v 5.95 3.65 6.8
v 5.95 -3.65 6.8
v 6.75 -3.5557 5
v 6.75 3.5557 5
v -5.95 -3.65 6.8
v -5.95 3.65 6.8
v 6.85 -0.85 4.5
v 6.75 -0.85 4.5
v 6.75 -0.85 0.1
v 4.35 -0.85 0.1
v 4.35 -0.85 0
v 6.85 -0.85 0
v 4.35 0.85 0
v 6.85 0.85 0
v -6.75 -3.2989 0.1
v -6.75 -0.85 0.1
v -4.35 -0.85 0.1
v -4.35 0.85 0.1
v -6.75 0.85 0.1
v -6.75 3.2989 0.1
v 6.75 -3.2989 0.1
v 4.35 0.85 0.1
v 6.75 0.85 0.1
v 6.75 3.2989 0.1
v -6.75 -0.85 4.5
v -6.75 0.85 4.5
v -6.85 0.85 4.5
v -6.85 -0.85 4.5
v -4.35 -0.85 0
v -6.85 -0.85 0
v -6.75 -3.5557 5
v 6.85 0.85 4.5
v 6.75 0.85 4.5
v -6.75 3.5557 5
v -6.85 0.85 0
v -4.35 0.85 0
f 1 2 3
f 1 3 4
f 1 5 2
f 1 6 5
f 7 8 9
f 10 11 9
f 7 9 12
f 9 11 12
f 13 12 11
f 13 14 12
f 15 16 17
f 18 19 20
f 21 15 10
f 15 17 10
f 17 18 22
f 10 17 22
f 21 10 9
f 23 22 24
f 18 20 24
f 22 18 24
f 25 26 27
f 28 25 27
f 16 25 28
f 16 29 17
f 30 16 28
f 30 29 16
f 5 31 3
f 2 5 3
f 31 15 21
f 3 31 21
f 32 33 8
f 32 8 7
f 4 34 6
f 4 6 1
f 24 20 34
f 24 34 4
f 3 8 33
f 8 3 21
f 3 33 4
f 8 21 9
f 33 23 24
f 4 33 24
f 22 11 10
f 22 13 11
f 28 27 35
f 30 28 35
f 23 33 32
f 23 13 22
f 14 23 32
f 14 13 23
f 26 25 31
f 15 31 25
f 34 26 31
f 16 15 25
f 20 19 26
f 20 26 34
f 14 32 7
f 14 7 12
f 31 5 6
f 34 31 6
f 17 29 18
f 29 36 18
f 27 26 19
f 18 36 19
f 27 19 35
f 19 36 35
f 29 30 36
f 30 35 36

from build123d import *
from OCP.BRepFilletAPI import BRepFilletAPI_MakeChamfer

# Parameters (mm, degrees)
BOSS_EXTRUDE1_START = 0.1
SKETCH1_W           = 13.5
SKETCH1_H           = 7.3
BOSS_EXTRUDE1_DEPTH = 6.7
CHAMFER1_SIZE       = 1.8
CHAMFER1_SIZE2      = 0.8
BOSS_EXTRUDE2_DEPTH = 0.85
DRAFT1_ANGLE        = -3


with BuildPart() as part:
    # Sketch1 → Boss-Extrude1 (new body)
    with BuildSketch(Plane.XY.offset(BOSS_EXTRUDE1_START)):
        Rectangle(SKETCH1_W, SKETCH1_H)
    extrude(amount=BOSS_EXTRUDE1_DEPTH)

    # Chamfer1: one chamfer whose edges measure the first distance from different faces: ONE call of the kernel's chamfer builder (chamfer() names one face for all edges)
    chamfer1_edges_1 = [part.edges().sort_by_distance(p)[0] for p in [
        (6.75, 0, 6.8),
    ]]
    chamfer1_side_1 = [part.faces().sort_by_distance(p)[0] for p in [
        (6.75, 0, 3.45),
    ]]
    chamfer1_edges_2 = [part.edges().sort_by_distance(p)[0] for p in [
        (-6.75, 0, 6.8),
    ]]
    chamfer1_side_2 = [part.faces().sort_by_distance(p)[0] for p in [
        (-6.75, 0, 3.45),
    ]]
    chamfer1 = BRepFilletAPI_MakeChamfer(part.part.solid().wrapped)
    for e in chamfer1_edges_1:
        chamfer1.Add(CHAMFER1_SIZE, CHAMFER1_SIZE2, e.wrapped, chamfer1_side_1[0].wrapped)  # the first distance lies on this face
    for e in chamfer1_edges_2:
        chamfer1.Add(CHAMFER1_SIZE, CHAMFER1_SIZE2, e.wrapped, chamfer1_side_2[0].wrapped)  # the first distance lies on this face
    add(Compound.cast(chamfer1.Shape()), mode=Mode.REPLACE)

    # Sketch2 → Boss-Extrude2 (add, symmetric)
    with BuildSketch(Plane(origin=(0, 0, 0), x_dir=(1, 0, 0), z_dir=(0, 1, 0))):
        Polygon((4.35, -0.1), (6.75, -0.1), (6.75, -4.5), (6.85, -4.5), (6.85, 0), (4.35, 0), align=None)
    boss_extrude2 = extrude(amount=BOSS_EXTRUDE2_DEPTH, both=True)

    # Mirror1: Boss-Extrude2 across plane
    add(boss_extrude2.mirror(Plane(origin=(0, 0, 0), x_dir=(0, 0, 1), z_dir=(1, 0, 0))))

    # Draft1
    draft1_faces = [part.faces().sort_by_distance(p)[0] for p in [
        (0, 3.65, 3.405510617),
        (0, -3.65, 3.405510617),
    ]]
    draft(draft1_faces, Plane.XY.offset(6.8), DRAFT1_ANGLE)


solid = part.part
